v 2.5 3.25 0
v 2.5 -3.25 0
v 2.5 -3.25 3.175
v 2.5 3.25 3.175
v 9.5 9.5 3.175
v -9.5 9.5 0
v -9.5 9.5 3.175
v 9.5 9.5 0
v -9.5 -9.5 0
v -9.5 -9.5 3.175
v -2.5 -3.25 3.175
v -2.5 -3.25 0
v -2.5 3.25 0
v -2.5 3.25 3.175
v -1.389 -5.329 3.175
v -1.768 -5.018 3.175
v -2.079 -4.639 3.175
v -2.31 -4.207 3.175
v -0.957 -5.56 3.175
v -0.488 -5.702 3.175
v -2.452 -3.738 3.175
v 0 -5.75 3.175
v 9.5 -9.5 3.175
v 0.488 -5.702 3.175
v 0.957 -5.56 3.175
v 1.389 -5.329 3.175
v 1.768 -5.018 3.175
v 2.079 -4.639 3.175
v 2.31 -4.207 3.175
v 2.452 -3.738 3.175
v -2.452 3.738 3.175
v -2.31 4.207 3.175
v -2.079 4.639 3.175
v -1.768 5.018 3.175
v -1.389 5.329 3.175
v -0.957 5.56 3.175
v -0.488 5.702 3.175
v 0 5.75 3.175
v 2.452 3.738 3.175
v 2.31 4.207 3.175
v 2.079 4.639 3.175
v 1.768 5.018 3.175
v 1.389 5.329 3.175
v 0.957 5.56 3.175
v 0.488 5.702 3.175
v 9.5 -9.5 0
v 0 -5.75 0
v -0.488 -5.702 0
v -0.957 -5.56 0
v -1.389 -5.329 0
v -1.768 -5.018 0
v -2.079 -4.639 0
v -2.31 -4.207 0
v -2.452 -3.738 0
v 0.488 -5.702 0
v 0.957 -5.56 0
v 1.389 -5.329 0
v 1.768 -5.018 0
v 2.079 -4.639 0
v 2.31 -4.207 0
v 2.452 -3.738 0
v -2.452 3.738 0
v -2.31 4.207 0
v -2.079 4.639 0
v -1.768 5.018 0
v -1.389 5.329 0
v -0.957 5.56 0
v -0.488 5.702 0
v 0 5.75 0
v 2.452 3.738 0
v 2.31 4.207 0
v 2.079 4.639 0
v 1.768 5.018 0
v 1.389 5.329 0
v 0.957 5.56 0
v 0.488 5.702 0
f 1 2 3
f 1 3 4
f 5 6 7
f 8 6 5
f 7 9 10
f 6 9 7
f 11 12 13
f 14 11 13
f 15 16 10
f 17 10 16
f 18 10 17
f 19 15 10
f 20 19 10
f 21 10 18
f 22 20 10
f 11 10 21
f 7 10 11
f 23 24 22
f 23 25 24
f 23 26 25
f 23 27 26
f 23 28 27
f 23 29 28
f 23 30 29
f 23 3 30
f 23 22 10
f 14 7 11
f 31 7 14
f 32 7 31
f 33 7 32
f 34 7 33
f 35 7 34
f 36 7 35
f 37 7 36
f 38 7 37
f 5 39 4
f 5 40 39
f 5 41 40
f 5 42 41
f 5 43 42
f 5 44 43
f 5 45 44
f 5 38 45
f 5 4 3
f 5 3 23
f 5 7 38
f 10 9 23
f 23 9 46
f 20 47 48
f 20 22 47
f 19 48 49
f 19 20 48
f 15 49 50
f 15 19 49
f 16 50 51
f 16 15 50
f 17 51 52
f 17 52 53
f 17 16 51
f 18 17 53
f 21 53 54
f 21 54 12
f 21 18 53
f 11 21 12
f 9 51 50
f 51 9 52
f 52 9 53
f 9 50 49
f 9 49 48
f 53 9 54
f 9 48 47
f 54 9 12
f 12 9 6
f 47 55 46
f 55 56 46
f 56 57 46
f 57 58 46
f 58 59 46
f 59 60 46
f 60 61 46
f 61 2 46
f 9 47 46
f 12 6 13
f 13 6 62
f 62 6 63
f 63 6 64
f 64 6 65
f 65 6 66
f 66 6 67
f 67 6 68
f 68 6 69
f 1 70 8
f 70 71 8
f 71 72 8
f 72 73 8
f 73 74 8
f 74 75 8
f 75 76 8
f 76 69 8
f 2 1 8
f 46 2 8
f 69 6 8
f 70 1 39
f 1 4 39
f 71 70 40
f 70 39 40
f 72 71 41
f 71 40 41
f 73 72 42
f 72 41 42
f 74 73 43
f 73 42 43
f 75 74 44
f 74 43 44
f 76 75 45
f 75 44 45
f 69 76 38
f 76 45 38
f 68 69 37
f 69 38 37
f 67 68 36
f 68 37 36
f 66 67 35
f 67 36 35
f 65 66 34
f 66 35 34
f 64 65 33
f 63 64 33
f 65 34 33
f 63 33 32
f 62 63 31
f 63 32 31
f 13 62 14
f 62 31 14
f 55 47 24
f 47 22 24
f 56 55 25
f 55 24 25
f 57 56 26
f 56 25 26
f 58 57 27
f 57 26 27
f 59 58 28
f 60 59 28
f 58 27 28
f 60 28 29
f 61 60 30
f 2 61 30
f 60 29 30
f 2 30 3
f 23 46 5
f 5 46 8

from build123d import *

# Parameters (mm, degrees)
F0_W     = 19
F0_H     = 19
F0_W_2   = 5
F0_H_2   = 11.5
F1_DEPTH = 3.175
F2_R     = 2.49999


# Not quite as in the source:
# - a fillet or chamfer is up to 0.001 mm smaller than in the source, because OpenCascade refuses the exact size


with BuildPart() as f1:
    # F0 (on Top) → F1 (new body)
    with BuildSketch(Plane.XY):
        Rectangle(F0_W, F0_H)
        Rectangle(F0_W_2, F0_H_2, mode=Mode.SUBTRACT)
    extrude(amount=F1_DEPTH)

    # F2 (radius 2.5 in the source; OpenCascade refuses exactly that, so slightly less here)
    f2_edges = [f1.edges().sort_by_distance(p)[0] for p in [
        (-2.5, 5.75, 1.5875),
        (-2.5, -5.75, 1.5875),
        (2.5, 5.75, 1.5875),
        (2.5, -5.75, 1.5875),
    ]]
    fillet(f2_edges, radius=F2_R)


solid = f1.part
